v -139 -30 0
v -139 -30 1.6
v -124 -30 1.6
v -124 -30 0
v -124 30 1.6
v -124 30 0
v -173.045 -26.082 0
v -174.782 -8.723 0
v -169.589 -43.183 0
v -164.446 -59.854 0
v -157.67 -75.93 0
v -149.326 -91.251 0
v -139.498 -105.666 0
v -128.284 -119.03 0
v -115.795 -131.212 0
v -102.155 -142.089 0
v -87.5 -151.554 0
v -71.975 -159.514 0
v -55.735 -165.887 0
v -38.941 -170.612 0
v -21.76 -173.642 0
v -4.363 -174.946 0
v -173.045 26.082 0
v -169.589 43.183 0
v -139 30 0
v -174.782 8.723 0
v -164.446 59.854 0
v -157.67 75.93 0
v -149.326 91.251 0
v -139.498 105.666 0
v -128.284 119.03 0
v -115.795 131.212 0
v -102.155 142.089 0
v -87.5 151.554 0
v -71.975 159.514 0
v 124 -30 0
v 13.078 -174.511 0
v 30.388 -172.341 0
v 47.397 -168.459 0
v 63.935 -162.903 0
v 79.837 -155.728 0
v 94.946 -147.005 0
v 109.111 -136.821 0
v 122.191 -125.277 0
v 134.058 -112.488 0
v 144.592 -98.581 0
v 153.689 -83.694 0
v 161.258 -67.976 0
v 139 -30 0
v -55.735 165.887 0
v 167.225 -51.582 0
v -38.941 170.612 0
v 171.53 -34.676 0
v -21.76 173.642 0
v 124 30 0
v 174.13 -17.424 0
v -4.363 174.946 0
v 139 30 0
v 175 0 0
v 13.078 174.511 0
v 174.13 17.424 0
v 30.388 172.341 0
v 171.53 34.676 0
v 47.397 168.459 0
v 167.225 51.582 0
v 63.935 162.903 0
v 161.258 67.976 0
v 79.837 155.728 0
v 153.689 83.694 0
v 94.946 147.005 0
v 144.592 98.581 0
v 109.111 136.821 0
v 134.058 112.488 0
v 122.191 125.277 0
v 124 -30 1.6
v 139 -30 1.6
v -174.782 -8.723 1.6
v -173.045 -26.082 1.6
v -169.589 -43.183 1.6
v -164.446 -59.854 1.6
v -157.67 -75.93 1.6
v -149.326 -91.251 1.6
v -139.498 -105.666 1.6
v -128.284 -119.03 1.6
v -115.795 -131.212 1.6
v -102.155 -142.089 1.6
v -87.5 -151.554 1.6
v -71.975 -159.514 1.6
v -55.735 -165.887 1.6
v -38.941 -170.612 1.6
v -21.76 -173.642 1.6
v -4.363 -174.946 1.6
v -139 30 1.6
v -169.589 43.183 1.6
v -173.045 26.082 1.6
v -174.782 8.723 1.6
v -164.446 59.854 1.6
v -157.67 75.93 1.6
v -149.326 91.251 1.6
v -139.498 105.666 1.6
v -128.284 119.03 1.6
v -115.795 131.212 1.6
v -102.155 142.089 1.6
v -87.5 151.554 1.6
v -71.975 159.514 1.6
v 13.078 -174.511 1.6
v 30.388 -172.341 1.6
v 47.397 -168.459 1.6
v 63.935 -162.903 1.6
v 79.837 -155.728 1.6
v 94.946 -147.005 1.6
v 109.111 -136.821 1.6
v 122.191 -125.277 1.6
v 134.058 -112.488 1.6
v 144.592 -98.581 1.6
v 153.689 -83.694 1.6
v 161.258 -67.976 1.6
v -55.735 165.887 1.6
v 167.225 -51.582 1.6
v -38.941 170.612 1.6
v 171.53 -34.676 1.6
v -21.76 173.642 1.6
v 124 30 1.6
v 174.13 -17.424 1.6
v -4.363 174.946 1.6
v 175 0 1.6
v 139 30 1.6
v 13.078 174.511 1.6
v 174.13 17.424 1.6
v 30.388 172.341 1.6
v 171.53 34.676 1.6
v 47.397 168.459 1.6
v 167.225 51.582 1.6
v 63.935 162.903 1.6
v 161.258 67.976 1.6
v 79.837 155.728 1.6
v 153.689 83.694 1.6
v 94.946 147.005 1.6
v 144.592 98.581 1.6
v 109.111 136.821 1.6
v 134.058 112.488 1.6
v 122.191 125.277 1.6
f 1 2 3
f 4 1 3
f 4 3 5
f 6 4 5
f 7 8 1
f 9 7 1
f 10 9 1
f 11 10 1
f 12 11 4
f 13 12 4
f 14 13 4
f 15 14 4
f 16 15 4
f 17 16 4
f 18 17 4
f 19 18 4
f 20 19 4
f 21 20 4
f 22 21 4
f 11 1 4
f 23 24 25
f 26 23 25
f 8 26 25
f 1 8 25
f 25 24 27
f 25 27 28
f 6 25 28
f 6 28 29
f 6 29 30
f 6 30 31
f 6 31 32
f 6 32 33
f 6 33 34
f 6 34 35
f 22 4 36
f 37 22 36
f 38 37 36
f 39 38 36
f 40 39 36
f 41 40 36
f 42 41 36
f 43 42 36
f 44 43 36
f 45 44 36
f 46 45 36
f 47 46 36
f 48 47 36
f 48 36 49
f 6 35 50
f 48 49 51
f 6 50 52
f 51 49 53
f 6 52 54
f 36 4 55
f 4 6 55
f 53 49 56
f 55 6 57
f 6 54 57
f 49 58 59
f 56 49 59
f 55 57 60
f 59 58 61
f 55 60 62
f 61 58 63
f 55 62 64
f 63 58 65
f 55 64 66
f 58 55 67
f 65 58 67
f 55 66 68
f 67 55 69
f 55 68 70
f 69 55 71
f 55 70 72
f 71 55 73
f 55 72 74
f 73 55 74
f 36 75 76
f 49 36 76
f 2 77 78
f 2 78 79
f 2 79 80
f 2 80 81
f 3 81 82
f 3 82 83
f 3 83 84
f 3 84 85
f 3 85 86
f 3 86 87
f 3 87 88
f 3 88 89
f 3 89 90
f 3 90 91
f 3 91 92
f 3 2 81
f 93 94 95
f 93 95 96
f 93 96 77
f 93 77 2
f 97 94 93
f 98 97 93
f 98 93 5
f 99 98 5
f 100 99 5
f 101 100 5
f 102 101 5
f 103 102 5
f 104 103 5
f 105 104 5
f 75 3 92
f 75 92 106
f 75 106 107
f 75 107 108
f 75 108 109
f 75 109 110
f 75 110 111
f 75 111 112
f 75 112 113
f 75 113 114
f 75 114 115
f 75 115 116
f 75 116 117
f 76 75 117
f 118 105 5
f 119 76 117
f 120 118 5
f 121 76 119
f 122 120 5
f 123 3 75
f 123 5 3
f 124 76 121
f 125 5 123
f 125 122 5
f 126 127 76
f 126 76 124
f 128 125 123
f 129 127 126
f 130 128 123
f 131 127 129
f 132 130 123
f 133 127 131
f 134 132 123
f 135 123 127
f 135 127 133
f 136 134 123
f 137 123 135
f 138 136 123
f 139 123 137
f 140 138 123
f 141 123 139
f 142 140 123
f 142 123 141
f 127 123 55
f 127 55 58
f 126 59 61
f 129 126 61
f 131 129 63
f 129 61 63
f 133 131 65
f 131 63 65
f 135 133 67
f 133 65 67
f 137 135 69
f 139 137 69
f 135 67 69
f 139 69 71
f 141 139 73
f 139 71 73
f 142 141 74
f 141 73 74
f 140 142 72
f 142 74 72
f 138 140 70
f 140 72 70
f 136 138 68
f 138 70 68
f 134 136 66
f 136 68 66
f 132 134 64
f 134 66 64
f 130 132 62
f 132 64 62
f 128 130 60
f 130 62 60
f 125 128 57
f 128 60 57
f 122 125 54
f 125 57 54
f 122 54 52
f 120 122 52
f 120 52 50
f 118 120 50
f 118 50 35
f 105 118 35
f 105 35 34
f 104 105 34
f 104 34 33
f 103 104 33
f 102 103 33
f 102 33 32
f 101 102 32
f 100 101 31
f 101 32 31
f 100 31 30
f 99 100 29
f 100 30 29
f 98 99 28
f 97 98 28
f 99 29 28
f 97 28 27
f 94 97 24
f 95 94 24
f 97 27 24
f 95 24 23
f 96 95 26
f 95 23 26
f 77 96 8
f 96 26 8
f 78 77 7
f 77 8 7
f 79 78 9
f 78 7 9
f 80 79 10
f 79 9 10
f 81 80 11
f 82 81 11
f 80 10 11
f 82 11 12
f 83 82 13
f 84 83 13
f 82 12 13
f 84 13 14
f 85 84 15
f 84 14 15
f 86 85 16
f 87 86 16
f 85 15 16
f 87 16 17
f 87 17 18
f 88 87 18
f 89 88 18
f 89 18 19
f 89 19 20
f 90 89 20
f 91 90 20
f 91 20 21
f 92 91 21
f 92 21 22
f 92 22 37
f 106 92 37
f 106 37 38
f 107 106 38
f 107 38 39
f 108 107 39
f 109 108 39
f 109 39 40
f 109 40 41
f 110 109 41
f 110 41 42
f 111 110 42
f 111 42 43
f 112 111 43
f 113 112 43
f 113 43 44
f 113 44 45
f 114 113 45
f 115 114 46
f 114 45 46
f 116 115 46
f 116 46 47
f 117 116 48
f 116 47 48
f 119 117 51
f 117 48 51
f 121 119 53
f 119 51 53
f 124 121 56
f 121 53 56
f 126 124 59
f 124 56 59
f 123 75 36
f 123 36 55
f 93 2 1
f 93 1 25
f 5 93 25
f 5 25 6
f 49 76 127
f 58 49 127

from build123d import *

# Parameters (mm, degrees)
SKETCH1_R           = 175
BOSS_EXTRUDE1_DEPTH = 1.6
SKETCH2_W           = 15
SKETCH2_H           = 60
CUT_EXTRUDE1_DEPTH  = 2.6


with BuildPart() as part:
    # Sketch1 → Boss-Extrude1 (new body)
    with BuildSketch(Plane.XY):
        Circle(SKETCH1_R)
    extrude(amount=BOSS_EXTRUDE1_DEPTH)

    # Sketch2 → Cut-Extrude1 (cut, through all)
    with BuildSketch(Plane.XY.offset(1.6)):
        with Locations((-131.5, 0)):
            Rectangle(SKETCH2_W, SKETCH2_H)
        with Locations((131.5, 0)):
            Rectangle(SKETCH2_W, SKETCH2_H)
    extrude(amount=-CUT_EXTRUDE1_DEPTH, mode=Mode.SUBTRACT)


solid = part.part
